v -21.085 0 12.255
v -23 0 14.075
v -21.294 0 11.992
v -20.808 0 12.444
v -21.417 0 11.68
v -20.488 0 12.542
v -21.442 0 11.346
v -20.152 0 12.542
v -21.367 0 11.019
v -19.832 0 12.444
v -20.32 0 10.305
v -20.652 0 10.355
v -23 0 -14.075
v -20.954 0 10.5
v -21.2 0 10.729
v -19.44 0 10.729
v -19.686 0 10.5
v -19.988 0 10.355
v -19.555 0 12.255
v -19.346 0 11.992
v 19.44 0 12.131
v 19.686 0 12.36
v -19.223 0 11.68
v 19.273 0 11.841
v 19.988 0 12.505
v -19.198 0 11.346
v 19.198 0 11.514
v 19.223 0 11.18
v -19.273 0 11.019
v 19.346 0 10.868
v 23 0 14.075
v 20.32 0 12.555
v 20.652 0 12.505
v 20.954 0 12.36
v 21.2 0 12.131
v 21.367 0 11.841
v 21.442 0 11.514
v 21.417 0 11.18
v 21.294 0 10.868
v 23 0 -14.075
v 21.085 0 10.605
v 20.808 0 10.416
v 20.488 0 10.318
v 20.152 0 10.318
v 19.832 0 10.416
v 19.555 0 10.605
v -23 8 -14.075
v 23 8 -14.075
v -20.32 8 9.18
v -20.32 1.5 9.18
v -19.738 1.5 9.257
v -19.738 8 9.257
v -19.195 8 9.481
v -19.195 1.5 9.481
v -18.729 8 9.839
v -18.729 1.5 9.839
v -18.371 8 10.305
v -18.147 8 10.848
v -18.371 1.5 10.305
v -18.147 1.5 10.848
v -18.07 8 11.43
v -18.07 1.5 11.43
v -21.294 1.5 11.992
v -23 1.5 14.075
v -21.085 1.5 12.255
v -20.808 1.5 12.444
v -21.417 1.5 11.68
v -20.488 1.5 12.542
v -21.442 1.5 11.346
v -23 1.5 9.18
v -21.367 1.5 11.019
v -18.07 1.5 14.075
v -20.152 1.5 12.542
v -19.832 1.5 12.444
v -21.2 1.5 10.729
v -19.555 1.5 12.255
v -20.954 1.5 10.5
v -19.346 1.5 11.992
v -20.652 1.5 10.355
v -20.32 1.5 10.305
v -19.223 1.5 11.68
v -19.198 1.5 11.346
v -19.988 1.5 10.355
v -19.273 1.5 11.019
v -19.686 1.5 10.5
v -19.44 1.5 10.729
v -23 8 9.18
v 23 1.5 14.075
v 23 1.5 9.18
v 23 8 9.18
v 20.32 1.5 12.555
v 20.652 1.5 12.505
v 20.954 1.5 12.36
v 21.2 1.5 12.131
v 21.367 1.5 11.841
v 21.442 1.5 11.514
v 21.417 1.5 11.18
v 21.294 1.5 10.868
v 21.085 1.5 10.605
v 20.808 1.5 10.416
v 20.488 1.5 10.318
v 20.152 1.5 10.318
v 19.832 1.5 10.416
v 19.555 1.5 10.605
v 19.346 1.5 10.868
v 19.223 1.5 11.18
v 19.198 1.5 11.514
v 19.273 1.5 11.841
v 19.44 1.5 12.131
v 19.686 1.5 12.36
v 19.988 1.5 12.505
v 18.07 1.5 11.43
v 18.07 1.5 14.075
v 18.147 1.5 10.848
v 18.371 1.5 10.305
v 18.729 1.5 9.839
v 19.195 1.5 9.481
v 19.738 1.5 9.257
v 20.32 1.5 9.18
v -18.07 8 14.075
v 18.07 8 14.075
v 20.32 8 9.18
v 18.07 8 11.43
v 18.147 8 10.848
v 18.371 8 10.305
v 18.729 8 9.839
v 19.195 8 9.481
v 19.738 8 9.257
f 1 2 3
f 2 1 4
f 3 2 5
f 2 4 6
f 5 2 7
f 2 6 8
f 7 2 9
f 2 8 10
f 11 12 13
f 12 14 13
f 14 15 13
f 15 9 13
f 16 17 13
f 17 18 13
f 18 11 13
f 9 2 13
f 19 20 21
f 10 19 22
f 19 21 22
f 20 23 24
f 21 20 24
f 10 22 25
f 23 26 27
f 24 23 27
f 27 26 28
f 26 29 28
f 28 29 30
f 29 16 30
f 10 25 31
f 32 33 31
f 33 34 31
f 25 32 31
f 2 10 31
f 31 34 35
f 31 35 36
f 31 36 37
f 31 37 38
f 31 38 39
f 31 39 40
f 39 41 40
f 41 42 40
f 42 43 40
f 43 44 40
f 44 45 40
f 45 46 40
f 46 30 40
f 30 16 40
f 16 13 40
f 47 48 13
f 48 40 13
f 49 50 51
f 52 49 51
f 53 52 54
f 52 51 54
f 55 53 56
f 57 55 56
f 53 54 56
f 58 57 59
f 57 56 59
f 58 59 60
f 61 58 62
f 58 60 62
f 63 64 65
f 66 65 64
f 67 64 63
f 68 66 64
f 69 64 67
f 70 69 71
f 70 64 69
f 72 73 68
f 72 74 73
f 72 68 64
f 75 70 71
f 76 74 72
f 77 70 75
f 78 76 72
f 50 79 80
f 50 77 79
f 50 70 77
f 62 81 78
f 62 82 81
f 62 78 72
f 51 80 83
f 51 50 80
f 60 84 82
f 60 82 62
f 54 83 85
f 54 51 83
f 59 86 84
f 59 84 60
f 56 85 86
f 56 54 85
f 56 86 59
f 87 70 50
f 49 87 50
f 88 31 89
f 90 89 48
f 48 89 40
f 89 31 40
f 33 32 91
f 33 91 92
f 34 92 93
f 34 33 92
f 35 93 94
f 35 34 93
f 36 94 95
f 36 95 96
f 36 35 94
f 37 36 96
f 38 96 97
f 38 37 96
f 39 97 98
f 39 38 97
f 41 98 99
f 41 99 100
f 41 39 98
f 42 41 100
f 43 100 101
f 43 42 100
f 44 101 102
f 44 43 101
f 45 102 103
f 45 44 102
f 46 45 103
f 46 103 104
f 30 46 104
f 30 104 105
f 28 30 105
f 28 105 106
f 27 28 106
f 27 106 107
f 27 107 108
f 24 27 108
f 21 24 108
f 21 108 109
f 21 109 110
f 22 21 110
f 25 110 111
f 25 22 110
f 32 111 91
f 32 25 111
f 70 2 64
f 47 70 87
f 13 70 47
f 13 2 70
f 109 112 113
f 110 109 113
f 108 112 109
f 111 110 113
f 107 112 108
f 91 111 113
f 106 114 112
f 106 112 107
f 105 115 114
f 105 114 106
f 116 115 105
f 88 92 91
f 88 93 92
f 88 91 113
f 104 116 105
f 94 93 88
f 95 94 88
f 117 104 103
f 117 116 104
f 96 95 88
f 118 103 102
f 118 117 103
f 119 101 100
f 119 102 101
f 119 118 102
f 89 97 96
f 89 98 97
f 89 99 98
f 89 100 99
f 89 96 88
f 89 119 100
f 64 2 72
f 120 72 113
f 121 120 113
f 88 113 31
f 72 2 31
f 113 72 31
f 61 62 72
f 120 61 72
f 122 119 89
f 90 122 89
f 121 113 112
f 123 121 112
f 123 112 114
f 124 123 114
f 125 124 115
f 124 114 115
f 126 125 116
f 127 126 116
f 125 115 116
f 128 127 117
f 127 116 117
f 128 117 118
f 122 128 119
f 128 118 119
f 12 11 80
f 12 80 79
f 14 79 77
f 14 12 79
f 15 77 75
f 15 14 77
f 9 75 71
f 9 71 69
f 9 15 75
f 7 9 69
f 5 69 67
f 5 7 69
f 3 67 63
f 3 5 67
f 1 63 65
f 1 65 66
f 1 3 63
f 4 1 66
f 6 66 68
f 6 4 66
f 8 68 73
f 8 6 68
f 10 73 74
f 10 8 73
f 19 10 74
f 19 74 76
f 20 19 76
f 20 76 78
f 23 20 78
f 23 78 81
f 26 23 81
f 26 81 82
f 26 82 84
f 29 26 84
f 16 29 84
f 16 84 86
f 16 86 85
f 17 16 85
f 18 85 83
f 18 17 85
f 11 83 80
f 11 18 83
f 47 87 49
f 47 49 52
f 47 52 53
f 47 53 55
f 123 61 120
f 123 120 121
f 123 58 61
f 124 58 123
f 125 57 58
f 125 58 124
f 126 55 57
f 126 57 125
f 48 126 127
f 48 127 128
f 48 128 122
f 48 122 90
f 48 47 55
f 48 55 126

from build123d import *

# Parameters (mm, degrees)
SKETCH1_W           = 46
SKETCH1_H           = 28.15
SKETCH1_R           = 1.125
BOSS_EXTRUDE1_DEPTH = 1.5
BOSS_EXTRUDE2_DEPTH = 6.5


with BuildPart() as part:
    # Sketch1 → Boss-Extrude1 (new body)
    with BuildSketch(Plane(origin=(0, 0, 0), x_dir=(1, 0, 0), z_dir=(0, 1, 0))):
        Rectangle(SKETCH1_W, SKETCH1_H)
        with Locations(Location((20.32, -11.43, 0), (0, 0, 270))):
            Circle(SKETCH1_R, mode=Mode.SUBTRACT)
        with Locations(Location((-20.32, -11.43, 0), (0, 0, 90))):
            Circle(SKETCH1_R, mode=Mode.SUBTRACT)
    extrude(amount=BOSS_EXTRUDE1_DEPTH)

    # Sketch2 → Boss-Extrude2 (add)
    with BuildSketch(Plane(origin=(0, 1.5, 0), x_dir=(1, 0, 0), z_dir=(0, 1, 0))):
        with BuildLine():
            Line((-18.07, -11.43), (-18.07, -14.075))
            Line((-18.07, -14.075), (18.07, -14.075))
            Line((18.07, -14.075), (18.07, -11.43))
            ThreePointArc((18.07, -11.43), (18.729009742, -9.839009742), (20.32, -9.18))
            Line((20.32, -9.18), (23, -9.18))
            Line((23, -9.18), (23, 14.075))
            Line((23, 14.075), (-23, 14.075))
            Line((-23, 14.075), (-23, -9.18))
            Line((-23, -9.18), (-20.32, -9.18))
            ThreePointArc((-20.32, -9.18), (-18.729009742, -9.839009742), (-18.07, -11.43))
        make_face()
    extrude(amount=BOSS_EXTRUDE2_DEPTH)


solid = part.part
